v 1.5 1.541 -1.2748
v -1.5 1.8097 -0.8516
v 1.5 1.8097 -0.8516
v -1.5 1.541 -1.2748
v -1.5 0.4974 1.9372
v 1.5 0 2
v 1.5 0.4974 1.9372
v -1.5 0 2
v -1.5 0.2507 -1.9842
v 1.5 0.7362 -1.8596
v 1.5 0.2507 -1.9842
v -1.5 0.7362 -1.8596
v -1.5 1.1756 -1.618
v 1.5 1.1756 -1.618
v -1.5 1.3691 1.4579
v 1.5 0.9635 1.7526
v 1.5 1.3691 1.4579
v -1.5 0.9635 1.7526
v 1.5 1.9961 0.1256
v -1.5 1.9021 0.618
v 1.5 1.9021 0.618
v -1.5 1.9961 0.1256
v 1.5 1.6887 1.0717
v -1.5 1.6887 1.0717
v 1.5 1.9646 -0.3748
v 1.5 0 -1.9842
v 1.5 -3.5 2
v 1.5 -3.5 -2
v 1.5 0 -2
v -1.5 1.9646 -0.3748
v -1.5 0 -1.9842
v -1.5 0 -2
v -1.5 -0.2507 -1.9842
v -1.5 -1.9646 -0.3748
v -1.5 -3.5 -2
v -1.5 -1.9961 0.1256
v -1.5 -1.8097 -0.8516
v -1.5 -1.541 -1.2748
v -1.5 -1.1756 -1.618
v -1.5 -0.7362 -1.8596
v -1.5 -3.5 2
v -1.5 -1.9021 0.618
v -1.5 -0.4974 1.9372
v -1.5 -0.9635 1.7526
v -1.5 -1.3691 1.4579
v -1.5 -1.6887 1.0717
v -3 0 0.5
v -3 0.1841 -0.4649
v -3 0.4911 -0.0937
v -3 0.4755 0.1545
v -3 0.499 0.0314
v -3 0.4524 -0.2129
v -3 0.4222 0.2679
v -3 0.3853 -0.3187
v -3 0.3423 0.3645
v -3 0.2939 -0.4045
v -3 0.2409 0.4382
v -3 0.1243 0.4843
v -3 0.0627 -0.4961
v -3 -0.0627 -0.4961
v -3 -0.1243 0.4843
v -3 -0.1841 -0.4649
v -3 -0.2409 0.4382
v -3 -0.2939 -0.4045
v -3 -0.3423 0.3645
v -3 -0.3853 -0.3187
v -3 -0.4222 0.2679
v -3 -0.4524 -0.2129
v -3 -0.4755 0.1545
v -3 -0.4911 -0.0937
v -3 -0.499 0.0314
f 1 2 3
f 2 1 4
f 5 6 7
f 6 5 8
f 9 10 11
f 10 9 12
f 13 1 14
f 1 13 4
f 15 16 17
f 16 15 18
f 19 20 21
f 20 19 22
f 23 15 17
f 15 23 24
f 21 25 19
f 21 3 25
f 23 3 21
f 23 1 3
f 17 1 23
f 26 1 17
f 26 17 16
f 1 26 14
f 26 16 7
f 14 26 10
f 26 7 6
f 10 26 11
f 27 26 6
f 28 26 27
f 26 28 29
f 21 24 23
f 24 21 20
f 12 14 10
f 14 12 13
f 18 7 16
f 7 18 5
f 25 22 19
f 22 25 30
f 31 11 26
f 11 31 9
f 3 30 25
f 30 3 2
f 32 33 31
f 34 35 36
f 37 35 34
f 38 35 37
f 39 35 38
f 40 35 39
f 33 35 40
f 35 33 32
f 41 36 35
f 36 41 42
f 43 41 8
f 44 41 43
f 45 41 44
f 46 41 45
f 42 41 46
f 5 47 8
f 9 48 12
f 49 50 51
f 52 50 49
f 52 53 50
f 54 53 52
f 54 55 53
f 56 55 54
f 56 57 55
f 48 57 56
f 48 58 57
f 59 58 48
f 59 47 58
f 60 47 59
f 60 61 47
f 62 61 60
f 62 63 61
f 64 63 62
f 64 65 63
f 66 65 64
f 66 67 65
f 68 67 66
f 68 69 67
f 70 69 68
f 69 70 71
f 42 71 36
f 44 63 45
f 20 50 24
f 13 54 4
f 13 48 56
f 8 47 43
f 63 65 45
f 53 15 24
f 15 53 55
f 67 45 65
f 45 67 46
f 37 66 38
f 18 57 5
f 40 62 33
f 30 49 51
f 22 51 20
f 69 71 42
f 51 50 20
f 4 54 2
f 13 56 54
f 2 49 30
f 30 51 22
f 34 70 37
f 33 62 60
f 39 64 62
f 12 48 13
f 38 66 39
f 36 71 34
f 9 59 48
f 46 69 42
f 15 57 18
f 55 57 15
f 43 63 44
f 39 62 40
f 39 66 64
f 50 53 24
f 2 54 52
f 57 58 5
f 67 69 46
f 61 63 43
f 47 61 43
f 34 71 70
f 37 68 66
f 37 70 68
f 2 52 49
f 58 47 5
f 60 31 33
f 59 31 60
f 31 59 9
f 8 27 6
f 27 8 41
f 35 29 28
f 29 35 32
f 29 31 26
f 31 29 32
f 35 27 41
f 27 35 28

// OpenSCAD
rotate(a=[0, -90, 0]) cylinder(r=2, h=3, center=true, $fn=25);
translate([-2.25,0,0]) rotate(a=[0, -90, 0]) cylinder(r1=2, r2=.5, h=1.5, center=true, $fn=25);
translate([0, -1.75,0]) cube([3, 3.5, 4], center=true);
